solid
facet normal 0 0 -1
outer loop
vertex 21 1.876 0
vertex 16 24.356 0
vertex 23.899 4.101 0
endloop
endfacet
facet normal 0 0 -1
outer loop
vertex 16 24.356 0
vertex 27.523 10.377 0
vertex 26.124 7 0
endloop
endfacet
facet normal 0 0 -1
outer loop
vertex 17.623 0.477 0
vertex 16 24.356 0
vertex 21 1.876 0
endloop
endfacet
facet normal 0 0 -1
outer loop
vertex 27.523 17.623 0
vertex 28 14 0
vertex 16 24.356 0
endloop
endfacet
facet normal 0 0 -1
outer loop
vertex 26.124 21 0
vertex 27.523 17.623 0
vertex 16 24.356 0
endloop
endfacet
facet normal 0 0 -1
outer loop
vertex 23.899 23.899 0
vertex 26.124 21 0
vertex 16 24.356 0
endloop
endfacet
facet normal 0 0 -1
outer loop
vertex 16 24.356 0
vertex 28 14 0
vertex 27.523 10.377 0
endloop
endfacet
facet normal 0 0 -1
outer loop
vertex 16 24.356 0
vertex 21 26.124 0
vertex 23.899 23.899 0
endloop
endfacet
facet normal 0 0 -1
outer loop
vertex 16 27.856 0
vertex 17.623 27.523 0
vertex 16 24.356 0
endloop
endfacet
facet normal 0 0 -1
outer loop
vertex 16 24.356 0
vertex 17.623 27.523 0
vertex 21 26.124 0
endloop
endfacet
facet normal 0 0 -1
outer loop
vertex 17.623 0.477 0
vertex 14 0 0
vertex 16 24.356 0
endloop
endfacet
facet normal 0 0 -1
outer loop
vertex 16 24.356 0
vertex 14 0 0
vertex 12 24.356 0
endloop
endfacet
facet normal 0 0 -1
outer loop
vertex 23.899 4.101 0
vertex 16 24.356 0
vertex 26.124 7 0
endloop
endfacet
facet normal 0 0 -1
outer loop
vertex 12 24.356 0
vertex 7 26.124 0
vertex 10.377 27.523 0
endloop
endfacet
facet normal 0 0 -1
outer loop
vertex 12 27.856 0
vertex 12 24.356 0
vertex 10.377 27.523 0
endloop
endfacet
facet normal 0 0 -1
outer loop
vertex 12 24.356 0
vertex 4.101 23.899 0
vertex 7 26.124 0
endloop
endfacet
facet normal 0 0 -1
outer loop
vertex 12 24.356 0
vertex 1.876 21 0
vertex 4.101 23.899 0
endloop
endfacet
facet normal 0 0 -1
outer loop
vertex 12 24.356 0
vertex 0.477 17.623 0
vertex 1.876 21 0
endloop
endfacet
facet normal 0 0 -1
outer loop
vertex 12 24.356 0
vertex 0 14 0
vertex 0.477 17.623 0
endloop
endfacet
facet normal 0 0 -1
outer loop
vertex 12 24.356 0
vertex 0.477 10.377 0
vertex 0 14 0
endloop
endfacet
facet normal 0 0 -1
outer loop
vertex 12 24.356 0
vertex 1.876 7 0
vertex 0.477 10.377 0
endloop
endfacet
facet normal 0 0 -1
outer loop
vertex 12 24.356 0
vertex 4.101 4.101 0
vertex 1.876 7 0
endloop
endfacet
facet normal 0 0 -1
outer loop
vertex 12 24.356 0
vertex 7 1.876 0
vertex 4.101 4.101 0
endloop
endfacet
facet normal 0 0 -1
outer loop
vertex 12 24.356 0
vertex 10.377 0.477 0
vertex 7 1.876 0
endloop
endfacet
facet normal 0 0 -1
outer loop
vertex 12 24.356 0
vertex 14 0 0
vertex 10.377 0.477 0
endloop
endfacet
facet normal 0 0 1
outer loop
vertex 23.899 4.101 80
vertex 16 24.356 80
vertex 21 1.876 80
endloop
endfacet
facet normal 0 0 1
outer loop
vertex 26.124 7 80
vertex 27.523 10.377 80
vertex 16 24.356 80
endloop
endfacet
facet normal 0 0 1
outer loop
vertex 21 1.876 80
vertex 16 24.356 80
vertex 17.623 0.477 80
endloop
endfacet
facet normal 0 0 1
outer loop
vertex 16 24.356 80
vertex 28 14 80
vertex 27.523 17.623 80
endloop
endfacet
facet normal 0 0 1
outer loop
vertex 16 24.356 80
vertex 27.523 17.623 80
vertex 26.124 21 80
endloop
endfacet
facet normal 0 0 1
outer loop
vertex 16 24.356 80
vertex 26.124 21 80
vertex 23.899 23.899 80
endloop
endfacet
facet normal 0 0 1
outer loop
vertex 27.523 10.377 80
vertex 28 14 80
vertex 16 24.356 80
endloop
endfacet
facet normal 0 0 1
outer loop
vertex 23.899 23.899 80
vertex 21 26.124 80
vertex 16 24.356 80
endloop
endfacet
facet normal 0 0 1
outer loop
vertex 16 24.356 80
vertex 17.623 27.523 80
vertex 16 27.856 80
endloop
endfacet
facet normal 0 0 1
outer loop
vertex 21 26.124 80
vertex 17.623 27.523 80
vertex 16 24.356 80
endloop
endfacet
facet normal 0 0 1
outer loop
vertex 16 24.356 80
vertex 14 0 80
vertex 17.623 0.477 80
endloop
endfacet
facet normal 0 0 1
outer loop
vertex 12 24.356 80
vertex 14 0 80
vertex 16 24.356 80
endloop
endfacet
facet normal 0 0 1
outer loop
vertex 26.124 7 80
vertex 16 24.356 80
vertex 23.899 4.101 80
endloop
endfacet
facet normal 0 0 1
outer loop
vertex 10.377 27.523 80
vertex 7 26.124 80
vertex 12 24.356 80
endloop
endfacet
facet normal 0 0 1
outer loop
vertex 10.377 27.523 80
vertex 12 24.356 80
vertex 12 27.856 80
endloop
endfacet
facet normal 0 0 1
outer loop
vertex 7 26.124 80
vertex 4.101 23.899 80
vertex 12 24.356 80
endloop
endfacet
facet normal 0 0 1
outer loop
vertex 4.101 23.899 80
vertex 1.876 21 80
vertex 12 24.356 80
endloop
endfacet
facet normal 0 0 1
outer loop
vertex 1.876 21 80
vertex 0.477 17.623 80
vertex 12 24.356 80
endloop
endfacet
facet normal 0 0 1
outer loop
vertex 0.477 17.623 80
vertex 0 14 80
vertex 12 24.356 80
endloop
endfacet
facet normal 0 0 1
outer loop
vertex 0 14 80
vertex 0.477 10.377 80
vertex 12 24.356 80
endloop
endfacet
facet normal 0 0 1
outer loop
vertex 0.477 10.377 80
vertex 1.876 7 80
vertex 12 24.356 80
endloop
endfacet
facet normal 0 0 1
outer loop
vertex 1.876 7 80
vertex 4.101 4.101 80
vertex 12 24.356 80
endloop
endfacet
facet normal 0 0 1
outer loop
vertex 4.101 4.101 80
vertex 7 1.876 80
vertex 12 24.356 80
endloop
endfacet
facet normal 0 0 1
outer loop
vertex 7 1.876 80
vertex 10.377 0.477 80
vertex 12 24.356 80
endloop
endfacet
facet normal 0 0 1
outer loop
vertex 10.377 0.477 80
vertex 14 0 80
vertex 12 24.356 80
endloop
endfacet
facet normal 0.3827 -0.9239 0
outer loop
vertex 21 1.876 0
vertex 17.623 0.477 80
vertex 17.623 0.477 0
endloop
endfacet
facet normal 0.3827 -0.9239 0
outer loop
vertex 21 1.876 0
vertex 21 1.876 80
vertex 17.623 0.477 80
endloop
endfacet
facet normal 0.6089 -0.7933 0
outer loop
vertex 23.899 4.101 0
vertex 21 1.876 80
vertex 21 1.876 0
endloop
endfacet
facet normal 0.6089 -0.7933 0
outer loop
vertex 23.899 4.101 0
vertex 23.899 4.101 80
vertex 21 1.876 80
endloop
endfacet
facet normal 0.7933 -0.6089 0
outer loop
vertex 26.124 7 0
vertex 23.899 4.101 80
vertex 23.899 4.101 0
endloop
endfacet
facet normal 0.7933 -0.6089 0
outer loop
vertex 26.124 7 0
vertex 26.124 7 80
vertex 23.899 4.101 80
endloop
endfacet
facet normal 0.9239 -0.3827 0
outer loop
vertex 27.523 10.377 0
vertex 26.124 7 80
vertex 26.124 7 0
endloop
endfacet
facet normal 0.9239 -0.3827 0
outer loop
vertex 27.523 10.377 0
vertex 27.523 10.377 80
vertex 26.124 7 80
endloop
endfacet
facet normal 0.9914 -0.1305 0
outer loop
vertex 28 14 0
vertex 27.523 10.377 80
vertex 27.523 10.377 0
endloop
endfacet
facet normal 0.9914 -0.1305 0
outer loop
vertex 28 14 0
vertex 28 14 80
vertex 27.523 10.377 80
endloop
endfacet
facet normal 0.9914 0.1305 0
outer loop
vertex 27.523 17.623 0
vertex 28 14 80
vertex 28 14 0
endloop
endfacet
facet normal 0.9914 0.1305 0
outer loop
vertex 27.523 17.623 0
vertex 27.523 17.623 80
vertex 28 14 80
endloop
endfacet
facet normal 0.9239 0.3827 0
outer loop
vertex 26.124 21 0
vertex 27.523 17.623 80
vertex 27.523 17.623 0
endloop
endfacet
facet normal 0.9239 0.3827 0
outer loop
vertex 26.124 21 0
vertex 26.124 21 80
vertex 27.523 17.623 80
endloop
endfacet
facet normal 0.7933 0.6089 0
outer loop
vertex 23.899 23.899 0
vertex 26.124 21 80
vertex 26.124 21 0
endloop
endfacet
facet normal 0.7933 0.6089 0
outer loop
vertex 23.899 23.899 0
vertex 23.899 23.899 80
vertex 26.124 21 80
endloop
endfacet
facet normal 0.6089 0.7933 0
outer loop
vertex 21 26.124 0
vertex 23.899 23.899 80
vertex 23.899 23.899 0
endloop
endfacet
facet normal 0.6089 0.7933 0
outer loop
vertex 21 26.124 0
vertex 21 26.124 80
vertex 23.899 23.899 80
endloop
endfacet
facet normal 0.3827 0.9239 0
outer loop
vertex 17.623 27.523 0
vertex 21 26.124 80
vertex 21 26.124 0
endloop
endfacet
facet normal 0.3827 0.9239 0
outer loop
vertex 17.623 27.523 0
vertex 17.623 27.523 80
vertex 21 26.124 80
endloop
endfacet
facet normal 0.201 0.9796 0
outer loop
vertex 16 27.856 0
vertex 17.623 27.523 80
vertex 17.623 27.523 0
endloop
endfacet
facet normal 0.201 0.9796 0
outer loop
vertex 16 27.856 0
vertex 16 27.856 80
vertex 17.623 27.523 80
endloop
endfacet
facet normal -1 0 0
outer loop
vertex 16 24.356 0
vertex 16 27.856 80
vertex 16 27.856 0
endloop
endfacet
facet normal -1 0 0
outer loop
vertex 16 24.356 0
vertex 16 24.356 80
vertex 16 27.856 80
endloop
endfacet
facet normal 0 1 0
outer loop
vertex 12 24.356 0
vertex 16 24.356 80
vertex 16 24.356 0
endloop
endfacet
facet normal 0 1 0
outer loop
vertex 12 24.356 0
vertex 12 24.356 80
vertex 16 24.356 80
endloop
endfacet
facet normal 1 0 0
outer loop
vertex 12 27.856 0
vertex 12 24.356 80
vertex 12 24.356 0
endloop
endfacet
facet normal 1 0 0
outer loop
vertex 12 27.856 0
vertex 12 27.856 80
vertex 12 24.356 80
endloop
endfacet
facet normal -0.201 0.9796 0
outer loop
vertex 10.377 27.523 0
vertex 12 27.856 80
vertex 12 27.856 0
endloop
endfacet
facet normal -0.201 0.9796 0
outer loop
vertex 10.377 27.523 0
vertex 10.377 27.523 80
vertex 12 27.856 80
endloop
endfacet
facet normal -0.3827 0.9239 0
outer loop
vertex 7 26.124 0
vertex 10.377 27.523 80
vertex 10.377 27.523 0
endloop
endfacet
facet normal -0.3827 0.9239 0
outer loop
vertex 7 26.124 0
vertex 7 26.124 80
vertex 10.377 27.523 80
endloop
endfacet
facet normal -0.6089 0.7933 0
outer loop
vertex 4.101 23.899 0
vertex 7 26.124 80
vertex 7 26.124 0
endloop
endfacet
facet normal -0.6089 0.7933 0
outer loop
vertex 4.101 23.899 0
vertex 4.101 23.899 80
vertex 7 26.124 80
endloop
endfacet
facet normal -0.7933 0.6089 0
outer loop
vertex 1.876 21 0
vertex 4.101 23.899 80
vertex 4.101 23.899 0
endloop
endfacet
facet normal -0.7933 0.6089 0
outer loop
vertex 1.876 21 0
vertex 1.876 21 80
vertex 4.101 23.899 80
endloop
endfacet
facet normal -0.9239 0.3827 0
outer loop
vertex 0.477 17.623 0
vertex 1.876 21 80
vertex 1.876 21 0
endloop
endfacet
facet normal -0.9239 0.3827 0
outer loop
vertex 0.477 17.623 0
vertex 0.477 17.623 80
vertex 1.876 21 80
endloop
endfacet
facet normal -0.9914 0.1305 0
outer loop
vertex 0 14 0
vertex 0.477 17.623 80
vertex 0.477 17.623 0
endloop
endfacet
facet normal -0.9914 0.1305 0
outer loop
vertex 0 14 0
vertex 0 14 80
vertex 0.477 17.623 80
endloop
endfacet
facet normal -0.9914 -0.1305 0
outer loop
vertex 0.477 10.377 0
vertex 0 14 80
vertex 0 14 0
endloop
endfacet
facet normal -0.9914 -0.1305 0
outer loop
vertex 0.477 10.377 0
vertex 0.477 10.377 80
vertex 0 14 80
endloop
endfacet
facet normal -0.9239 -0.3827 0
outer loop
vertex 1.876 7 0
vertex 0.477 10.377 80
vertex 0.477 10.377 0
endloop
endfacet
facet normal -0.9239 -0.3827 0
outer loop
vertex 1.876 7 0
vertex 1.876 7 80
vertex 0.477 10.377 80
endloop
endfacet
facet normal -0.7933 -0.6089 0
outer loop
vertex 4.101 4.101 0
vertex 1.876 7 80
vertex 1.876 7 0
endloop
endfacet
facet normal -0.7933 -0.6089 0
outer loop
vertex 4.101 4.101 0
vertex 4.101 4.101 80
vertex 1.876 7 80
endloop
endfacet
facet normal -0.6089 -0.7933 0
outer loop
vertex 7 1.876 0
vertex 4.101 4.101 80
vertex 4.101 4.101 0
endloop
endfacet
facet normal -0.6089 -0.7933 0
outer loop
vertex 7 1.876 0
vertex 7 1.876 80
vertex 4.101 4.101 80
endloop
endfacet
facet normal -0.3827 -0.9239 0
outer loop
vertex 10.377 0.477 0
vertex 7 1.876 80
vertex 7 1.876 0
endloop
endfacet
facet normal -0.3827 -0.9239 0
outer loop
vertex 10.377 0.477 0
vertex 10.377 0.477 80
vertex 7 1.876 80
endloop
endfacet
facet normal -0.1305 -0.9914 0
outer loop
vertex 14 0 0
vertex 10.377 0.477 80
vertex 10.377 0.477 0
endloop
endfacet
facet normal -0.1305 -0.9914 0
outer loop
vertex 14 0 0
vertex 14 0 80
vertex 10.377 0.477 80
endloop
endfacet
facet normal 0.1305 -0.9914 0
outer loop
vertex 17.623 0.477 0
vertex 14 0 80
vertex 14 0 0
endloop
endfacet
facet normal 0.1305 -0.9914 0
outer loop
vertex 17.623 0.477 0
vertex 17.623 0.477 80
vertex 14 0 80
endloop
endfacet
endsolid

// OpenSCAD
$fn = 32;

// ----------------------------------------------------------------------
// Keyway shaft: d28 shaft, key 4 x 3.5 mm
// ----------------------------------------------------------------------

// --- parameters (mm) ---
shaft_r = 14;             // shaft radius
key_w = 4;                // keyway width
key_d = 3.5;              // keyway depth below the surface line
plate_t = 80;             // shaft length, Z (extrusion height)

shaft_d = 2 * shaft_r;  // shaft diameter
circle_step = 15;  // polygon sampling step, degrees

profile = [[10.377, 27.523], [7, 26.124], [4.101, 23.899], [1.876, 21], [0.477, 17.623], [0, 14], [0.477, 10.377], [1.876, 7], [4.101, 4.101], [7, 1.876], [10.377, 0.477], [14, 0], [17.623, 0.477], [21, 1.876], [23.899, 4.101], [26.124, 7], [27.523, 10.377], [28, 14], [27.523, 17.623], [26.124, 21], [23.899, 23.899], [21, 26.124], [17.623, 27.523], [16, 27.856], [16, 24.356], [12, 24.356], [12, 27.856]];  // primary outline, 27 points, counter clockwise

// --- the one profile operation ---
linear_extrude(height = plate_t) polygon(points = profile);
